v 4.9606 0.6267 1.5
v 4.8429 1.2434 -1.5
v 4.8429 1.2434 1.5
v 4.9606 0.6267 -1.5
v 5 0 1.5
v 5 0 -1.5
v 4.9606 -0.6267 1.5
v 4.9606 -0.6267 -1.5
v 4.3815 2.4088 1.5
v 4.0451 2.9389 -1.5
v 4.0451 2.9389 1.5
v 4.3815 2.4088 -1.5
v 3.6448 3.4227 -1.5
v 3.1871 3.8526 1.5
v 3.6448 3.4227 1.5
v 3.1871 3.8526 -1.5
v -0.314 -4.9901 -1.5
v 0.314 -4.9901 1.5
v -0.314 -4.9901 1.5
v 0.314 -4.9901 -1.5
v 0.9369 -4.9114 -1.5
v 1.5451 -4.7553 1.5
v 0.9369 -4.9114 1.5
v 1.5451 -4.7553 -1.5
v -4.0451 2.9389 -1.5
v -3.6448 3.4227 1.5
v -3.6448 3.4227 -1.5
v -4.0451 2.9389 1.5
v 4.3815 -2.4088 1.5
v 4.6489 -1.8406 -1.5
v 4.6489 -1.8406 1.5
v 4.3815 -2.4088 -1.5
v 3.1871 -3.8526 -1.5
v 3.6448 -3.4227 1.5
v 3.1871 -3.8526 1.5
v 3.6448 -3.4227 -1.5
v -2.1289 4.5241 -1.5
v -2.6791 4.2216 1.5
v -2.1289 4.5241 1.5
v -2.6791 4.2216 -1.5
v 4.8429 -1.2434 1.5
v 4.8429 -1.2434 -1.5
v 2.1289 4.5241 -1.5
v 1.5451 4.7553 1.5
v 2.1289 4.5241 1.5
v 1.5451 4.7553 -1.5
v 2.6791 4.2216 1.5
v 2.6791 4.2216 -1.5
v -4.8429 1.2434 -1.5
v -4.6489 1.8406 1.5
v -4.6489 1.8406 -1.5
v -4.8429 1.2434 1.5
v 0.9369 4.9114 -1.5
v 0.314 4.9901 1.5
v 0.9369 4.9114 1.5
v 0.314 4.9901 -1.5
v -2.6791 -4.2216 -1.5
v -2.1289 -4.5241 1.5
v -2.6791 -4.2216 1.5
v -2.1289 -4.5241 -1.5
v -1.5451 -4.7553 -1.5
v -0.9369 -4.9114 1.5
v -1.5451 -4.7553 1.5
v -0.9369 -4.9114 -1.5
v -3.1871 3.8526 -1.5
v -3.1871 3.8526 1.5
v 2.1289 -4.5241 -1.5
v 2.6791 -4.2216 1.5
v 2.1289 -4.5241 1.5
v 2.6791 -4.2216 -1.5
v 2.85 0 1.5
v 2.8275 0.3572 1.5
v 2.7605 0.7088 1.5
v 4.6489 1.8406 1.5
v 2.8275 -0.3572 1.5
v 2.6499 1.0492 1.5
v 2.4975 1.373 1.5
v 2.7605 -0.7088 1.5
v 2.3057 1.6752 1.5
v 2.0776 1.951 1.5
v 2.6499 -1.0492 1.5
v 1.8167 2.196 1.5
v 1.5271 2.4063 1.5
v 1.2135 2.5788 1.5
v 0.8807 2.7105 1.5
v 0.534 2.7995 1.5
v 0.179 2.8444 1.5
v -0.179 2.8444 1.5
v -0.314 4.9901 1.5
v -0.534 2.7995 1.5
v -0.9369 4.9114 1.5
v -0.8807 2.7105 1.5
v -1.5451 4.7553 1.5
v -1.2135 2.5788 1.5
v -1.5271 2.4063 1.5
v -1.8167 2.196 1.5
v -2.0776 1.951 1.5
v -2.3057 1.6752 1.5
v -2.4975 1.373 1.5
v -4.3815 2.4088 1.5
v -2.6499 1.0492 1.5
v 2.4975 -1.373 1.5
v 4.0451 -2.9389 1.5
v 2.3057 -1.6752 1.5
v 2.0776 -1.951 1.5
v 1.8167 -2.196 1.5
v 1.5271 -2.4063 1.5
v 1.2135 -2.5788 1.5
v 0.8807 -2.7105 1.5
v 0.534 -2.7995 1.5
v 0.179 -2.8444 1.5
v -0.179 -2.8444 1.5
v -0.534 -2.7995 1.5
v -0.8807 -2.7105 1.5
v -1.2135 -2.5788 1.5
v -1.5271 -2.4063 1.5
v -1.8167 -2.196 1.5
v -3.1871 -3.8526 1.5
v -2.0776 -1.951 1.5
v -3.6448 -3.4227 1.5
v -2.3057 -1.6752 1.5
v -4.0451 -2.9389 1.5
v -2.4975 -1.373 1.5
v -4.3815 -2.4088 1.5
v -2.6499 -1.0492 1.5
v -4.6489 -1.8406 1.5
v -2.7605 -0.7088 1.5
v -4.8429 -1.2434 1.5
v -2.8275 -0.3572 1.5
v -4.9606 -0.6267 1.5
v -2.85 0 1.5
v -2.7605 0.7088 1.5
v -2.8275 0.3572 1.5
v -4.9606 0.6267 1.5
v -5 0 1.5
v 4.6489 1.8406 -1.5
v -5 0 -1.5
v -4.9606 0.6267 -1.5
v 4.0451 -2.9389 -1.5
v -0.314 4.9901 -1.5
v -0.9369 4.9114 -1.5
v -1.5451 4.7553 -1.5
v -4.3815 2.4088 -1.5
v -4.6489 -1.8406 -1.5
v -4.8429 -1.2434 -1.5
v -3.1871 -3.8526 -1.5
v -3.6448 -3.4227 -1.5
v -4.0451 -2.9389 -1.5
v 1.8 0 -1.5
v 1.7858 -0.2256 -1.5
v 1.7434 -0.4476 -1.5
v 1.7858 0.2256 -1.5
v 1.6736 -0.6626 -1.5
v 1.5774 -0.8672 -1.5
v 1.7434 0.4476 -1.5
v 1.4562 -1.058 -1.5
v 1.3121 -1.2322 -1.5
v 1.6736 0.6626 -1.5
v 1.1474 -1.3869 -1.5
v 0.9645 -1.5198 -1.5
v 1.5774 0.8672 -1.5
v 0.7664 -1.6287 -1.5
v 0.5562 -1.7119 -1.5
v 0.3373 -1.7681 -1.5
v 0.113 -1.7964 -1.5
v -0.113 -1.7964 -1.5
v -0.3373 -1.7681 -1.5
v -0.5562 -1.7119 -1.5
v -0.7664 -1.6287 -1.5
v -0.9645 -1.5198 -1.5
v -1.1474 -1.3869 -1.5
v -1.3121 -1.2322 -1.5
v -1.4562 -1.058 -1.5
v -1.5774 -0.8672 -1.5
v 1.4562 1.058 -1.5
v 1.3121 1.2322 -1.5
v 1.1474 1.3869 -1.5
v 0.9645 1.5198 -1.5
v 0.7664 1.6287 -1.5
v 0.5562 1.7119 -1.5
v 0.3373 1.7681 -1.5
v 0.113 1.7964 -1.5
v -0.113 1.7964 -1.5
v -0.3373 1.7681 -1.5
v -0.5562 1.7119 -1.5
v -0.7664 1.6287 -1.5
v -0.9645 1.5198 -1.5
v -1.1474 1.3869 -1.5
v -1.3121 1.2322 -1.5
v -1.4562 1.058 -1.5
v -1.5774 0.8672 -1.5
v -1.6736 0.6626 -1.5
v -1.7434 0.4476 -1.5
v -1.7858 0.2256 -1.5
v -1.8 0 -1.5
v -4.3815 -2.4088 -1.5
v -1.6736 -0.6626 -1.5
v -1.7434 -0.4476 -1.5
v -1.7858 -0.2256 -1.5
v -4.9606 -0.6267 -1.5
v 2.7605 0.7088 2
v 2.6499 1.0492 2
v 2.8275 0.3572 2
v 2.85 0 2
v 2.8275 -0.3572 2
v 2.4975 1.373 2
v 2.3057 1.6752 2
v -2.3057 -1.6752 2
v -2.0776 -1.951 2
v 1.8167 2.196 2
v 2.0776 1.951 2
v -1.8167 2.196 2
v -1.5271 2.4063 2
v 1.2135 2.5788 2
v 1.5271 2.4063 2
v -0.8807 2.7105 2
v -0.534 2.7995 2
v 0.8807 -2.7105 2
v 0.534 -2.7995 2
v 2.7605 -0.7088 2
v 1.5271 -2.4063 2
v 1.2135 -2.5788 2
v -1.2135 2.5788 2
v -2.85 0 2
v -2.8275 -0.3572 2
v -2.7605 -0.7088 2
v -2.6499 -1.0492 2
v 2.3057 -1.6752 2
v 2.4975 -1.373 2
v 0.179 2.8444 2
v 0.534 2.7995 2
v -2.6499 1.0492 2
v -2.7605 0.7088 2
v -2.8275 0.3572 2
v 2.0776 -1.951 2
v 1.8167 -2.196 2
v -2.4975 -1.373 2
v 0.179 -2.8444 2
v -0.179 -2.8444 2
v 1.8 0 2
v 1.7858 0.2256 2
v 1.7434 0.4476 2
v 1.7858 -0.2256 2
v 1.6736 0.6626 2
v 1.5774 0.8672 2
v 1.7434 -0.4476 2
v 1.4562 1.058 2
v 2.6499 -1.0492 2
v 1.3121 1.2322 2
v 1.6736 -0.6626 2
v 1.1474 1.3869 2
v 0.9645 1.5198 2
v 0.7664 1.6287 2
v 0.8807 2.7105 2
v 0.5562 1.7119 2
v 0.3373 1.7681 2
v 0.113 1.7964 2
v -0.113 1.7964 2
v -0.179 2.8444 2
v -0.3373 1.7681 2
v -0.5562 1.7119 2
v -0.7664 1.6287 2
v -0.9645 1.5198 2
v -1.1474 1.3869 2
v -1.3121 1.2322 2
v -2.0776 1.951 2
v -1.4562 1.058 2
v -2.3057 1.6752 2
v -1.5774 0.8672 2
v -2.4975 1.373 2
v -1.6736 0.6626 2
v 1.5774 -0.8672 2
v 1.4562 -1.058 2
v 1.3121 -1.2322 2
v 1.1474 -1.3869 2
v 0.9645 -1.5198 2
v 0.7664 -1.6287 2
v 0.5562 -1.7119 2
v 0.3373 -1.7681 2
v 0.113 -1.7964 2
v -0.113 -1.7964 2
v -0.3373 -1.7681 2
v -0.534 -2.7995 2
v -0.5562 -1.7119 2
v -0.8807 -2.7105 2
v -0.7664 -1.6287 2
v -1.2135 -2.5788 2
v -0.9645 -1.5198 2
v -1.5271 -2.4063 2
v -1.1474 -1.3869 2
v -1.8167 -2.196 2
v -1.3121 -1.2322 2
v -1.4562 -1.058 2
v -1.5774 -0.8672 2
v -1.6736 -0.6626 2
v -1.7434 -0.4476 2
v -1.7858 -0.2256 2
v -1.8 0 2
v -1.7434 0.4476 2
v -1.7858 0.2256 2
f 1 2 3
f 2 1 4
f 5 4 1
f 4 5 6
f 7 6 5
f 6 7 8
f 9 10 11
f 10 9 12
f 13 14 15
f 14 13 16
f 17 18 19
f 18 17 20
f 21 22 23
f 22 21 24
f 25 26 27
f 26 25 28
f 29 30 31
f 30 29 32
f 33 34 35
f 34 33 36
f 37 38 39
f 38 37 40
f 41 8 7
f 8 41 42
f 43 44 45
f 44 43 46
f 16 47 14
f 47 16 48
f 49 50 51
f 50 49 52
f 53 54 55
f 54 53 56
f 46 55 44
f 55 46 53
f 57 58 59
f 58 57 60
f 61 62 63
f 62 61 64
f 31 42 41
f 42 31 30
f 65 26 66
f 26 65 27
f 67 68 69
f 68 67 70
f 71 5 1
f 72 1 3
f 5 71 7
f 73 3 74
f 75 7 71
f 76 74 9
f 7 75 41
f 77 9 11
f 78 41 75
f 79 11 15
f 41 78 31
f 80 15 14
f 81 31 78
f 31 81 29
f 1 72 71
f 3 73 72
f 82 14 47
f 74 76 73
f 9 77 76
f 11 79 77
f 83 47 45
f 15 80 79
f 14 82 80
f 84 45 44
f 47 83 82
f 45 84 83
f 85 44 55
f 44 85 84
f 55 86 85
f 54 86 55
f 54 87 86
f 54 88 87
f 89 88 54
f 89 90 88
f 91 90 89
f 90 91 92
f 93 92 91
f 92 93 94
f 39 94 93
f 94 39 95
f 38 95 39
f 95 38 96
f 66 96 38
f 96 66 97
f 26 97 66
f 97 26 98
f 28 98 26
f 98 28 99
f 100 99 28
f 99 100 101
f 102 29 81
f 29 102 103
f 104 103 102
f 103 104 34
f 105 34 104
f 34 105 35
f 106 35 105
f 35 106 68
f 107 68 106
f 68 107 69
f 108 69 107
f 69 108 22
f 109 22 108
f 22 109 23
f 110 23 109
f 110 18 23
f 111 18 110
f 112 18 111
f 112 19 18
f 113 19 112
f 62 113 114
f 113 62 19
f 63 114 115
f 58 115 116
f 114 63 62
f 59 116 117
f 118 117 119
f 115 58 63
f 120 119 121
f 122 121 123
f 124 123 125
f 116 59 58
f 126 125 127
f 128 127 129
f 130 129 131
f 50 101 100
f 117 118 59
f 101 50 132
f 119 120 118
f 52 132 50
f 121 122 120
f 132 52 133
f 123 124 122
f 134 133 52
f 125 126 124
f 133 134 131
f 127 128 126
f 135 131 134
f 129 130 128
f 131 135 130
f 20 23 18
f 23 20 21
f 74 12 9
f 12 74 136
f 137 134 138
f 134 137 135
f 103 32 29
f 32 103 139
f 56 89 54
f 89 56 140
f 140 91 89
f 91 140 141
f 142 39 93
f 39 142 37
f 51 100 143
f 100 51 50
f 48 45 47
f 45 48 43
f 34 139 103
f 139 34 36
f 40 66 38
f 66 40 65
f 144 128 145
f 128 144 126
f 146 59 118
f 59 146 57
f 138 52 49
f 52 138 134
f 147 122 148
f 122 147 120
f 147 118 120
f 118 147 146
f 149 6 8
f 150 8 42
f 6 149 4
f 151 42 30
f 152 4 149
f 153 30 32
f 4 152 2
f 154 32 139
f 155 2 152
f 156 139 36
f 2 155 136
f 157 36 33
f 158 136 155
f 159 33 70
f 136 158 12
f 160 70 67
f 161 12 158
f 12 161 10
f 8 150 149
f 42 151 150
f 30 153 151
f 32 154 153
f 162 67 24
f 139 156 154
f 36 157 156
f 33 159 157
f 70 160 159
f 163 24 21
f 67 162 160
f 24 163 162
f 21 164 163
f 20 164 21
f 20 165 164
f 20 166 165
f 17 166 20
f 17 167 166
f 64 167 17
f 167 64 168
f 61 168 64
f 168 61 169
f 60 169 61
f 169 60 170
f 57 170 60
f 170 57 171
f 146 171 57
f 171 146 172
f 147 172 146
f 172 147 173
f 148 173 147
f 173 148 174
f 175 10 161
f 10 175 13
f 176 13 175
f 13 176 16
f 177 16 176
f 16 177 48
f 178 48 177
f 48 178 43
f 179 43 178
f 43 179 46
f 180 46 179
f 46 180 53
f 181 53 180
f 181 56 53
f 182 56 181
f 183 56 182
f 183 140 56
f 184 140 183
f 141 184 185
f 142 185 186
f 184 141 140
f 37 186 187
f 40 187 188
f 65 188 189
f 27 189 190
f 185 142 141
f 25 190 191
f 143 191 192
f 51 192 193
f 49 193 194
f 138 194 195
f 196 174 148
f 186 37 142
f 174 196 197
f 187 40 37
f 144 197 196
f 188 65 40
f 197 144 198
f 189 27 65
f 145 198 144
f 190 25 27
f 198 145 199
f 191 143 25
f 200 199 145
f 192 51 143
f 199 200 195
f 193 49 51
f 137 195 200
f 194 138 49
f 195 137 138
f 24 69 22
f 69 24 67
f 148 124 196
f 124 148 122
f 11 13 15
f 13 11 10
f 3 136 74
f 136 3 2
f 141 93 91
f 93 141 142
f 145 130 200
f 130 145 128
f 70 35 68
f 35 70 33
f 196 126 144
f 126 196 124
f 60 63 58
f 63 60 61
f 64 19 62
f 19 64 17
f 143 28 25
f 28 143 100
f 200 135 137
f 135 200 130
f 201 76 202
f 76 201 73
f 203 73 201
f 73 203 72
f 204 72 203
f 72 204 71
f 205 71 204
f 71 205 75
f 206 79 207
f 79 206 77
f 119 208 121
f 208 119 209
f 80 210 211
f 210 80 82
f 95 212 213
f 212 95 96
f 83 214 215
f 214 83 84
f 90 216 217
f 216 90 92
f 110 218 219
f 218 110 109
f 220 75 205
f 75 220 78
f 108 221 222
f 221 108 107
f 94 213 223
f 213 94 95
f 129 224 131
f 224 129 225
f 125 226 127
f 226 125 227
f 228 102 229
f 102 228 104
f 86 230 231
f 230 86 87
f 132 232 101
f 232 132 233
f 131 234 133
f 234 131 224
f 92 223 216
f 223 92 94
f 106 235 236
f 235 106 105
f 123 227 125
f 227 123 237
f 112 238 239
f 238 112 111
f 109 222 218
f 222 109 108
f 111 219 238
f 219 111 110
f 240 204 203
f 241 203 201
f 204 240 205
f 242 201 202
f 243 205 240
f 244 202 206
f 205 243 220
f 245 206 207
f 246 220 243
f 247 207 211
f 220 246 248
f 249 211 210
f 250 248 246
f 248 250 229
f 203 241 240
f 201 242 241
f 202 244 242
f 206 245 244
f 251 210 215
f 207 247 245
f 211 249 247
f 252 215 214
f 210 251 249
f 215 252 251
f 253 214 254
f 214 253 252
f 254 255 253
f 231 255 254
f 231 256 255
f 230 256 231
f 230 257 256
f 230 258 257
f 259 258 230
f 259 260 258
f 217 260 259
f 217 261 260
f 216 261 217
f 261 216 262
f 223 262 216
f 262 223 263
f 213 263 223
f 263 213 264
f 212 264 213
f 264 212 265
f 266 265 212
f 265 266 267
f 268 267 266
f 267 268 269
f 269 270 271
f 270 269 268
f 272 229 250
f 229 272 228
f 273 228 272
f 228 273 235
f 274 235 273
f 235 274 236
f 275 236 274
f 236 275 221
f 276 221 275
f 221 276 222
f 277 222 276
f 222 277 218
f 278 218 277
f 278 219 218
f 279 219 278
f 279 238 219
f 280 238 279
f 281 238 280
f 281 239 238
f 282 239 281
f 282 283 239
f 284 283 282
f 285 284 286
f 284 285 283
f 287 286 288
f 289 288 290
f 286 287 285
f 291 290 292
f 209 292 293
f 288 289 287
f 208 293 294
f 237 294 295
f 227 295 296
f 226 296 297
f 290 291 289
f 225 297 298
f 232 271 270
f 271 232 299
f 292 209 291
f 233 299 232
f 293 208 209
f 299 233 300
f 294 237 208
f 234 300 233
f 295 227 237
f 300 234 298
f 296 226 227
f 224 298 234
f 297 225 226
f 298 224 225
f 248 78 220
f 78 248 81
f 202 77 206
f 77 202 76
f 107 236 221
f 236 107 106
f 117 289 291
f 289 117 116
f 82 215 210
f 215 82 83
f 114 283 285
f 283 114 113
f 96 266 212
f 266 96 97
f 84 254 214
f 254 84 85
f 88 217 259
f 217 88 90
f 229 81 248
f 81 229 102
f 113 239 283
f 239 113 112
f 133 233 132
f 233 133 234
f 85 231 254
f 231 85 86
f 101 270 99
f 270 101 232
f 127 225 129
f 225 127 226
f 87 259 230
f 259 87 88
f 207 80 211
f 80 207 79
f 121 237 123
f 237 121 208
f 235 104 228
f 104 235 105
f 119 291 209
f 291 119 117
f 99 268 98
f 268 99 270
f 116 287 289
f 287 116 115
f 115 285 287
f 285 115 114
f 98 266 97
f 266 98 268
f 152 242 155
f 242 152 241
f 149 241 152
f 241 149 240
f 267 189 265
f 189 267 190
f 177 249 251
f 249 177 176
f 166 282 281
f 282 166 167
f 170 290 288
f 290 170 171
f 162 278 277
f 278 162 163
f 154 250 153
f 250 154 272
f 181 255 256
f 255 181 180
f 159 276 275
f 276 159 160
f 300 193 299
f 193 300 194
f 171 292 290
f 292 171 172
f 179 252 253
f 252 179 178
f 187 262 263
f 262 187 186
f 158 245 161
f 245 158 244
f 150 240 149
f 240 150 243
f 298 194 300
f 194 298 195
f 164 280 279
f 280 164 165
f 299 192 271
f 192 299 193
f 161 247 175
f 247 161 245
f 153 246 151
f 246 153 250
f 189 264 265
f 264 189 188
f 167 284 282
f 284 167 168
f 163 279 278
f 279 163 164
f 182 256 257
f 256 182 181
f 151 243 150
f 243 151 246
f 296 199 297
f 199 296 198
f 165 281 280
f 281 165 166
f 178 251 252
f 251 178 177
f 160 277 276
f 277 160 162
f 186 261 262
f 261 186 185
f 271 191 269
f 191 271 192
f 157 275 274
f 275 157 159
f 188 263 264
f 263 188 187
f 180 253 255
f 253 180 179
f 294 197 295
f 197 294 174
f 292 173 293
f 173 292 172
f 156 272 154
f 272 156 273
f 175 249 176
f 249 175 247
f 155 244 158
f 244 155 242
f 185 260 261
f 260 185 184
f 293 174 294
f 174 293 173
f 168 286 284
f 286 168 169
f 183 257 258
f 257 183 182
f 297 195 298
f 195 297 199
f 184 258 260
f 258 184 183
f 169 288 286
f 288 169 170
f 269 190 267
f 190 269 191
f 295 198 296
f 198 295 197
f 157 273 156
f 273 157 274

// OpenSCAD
$fn = 50;


difference() {
	union() {
		translate(v = [0, 0, -1.5000000000]) {
			cylinder(h = 3, r = 5.0000000000);
		}
		translate(v = [0, 0, -1.5000000000]) {
			cylinder(h = 3.5000000000, r = 2.8500000000);
		}
	}
	union() {
		translate(v = [0, 0, -100.0000000000]) {
			cylinder(h = 200, r = 1.8000000000);
		}
	}
}
